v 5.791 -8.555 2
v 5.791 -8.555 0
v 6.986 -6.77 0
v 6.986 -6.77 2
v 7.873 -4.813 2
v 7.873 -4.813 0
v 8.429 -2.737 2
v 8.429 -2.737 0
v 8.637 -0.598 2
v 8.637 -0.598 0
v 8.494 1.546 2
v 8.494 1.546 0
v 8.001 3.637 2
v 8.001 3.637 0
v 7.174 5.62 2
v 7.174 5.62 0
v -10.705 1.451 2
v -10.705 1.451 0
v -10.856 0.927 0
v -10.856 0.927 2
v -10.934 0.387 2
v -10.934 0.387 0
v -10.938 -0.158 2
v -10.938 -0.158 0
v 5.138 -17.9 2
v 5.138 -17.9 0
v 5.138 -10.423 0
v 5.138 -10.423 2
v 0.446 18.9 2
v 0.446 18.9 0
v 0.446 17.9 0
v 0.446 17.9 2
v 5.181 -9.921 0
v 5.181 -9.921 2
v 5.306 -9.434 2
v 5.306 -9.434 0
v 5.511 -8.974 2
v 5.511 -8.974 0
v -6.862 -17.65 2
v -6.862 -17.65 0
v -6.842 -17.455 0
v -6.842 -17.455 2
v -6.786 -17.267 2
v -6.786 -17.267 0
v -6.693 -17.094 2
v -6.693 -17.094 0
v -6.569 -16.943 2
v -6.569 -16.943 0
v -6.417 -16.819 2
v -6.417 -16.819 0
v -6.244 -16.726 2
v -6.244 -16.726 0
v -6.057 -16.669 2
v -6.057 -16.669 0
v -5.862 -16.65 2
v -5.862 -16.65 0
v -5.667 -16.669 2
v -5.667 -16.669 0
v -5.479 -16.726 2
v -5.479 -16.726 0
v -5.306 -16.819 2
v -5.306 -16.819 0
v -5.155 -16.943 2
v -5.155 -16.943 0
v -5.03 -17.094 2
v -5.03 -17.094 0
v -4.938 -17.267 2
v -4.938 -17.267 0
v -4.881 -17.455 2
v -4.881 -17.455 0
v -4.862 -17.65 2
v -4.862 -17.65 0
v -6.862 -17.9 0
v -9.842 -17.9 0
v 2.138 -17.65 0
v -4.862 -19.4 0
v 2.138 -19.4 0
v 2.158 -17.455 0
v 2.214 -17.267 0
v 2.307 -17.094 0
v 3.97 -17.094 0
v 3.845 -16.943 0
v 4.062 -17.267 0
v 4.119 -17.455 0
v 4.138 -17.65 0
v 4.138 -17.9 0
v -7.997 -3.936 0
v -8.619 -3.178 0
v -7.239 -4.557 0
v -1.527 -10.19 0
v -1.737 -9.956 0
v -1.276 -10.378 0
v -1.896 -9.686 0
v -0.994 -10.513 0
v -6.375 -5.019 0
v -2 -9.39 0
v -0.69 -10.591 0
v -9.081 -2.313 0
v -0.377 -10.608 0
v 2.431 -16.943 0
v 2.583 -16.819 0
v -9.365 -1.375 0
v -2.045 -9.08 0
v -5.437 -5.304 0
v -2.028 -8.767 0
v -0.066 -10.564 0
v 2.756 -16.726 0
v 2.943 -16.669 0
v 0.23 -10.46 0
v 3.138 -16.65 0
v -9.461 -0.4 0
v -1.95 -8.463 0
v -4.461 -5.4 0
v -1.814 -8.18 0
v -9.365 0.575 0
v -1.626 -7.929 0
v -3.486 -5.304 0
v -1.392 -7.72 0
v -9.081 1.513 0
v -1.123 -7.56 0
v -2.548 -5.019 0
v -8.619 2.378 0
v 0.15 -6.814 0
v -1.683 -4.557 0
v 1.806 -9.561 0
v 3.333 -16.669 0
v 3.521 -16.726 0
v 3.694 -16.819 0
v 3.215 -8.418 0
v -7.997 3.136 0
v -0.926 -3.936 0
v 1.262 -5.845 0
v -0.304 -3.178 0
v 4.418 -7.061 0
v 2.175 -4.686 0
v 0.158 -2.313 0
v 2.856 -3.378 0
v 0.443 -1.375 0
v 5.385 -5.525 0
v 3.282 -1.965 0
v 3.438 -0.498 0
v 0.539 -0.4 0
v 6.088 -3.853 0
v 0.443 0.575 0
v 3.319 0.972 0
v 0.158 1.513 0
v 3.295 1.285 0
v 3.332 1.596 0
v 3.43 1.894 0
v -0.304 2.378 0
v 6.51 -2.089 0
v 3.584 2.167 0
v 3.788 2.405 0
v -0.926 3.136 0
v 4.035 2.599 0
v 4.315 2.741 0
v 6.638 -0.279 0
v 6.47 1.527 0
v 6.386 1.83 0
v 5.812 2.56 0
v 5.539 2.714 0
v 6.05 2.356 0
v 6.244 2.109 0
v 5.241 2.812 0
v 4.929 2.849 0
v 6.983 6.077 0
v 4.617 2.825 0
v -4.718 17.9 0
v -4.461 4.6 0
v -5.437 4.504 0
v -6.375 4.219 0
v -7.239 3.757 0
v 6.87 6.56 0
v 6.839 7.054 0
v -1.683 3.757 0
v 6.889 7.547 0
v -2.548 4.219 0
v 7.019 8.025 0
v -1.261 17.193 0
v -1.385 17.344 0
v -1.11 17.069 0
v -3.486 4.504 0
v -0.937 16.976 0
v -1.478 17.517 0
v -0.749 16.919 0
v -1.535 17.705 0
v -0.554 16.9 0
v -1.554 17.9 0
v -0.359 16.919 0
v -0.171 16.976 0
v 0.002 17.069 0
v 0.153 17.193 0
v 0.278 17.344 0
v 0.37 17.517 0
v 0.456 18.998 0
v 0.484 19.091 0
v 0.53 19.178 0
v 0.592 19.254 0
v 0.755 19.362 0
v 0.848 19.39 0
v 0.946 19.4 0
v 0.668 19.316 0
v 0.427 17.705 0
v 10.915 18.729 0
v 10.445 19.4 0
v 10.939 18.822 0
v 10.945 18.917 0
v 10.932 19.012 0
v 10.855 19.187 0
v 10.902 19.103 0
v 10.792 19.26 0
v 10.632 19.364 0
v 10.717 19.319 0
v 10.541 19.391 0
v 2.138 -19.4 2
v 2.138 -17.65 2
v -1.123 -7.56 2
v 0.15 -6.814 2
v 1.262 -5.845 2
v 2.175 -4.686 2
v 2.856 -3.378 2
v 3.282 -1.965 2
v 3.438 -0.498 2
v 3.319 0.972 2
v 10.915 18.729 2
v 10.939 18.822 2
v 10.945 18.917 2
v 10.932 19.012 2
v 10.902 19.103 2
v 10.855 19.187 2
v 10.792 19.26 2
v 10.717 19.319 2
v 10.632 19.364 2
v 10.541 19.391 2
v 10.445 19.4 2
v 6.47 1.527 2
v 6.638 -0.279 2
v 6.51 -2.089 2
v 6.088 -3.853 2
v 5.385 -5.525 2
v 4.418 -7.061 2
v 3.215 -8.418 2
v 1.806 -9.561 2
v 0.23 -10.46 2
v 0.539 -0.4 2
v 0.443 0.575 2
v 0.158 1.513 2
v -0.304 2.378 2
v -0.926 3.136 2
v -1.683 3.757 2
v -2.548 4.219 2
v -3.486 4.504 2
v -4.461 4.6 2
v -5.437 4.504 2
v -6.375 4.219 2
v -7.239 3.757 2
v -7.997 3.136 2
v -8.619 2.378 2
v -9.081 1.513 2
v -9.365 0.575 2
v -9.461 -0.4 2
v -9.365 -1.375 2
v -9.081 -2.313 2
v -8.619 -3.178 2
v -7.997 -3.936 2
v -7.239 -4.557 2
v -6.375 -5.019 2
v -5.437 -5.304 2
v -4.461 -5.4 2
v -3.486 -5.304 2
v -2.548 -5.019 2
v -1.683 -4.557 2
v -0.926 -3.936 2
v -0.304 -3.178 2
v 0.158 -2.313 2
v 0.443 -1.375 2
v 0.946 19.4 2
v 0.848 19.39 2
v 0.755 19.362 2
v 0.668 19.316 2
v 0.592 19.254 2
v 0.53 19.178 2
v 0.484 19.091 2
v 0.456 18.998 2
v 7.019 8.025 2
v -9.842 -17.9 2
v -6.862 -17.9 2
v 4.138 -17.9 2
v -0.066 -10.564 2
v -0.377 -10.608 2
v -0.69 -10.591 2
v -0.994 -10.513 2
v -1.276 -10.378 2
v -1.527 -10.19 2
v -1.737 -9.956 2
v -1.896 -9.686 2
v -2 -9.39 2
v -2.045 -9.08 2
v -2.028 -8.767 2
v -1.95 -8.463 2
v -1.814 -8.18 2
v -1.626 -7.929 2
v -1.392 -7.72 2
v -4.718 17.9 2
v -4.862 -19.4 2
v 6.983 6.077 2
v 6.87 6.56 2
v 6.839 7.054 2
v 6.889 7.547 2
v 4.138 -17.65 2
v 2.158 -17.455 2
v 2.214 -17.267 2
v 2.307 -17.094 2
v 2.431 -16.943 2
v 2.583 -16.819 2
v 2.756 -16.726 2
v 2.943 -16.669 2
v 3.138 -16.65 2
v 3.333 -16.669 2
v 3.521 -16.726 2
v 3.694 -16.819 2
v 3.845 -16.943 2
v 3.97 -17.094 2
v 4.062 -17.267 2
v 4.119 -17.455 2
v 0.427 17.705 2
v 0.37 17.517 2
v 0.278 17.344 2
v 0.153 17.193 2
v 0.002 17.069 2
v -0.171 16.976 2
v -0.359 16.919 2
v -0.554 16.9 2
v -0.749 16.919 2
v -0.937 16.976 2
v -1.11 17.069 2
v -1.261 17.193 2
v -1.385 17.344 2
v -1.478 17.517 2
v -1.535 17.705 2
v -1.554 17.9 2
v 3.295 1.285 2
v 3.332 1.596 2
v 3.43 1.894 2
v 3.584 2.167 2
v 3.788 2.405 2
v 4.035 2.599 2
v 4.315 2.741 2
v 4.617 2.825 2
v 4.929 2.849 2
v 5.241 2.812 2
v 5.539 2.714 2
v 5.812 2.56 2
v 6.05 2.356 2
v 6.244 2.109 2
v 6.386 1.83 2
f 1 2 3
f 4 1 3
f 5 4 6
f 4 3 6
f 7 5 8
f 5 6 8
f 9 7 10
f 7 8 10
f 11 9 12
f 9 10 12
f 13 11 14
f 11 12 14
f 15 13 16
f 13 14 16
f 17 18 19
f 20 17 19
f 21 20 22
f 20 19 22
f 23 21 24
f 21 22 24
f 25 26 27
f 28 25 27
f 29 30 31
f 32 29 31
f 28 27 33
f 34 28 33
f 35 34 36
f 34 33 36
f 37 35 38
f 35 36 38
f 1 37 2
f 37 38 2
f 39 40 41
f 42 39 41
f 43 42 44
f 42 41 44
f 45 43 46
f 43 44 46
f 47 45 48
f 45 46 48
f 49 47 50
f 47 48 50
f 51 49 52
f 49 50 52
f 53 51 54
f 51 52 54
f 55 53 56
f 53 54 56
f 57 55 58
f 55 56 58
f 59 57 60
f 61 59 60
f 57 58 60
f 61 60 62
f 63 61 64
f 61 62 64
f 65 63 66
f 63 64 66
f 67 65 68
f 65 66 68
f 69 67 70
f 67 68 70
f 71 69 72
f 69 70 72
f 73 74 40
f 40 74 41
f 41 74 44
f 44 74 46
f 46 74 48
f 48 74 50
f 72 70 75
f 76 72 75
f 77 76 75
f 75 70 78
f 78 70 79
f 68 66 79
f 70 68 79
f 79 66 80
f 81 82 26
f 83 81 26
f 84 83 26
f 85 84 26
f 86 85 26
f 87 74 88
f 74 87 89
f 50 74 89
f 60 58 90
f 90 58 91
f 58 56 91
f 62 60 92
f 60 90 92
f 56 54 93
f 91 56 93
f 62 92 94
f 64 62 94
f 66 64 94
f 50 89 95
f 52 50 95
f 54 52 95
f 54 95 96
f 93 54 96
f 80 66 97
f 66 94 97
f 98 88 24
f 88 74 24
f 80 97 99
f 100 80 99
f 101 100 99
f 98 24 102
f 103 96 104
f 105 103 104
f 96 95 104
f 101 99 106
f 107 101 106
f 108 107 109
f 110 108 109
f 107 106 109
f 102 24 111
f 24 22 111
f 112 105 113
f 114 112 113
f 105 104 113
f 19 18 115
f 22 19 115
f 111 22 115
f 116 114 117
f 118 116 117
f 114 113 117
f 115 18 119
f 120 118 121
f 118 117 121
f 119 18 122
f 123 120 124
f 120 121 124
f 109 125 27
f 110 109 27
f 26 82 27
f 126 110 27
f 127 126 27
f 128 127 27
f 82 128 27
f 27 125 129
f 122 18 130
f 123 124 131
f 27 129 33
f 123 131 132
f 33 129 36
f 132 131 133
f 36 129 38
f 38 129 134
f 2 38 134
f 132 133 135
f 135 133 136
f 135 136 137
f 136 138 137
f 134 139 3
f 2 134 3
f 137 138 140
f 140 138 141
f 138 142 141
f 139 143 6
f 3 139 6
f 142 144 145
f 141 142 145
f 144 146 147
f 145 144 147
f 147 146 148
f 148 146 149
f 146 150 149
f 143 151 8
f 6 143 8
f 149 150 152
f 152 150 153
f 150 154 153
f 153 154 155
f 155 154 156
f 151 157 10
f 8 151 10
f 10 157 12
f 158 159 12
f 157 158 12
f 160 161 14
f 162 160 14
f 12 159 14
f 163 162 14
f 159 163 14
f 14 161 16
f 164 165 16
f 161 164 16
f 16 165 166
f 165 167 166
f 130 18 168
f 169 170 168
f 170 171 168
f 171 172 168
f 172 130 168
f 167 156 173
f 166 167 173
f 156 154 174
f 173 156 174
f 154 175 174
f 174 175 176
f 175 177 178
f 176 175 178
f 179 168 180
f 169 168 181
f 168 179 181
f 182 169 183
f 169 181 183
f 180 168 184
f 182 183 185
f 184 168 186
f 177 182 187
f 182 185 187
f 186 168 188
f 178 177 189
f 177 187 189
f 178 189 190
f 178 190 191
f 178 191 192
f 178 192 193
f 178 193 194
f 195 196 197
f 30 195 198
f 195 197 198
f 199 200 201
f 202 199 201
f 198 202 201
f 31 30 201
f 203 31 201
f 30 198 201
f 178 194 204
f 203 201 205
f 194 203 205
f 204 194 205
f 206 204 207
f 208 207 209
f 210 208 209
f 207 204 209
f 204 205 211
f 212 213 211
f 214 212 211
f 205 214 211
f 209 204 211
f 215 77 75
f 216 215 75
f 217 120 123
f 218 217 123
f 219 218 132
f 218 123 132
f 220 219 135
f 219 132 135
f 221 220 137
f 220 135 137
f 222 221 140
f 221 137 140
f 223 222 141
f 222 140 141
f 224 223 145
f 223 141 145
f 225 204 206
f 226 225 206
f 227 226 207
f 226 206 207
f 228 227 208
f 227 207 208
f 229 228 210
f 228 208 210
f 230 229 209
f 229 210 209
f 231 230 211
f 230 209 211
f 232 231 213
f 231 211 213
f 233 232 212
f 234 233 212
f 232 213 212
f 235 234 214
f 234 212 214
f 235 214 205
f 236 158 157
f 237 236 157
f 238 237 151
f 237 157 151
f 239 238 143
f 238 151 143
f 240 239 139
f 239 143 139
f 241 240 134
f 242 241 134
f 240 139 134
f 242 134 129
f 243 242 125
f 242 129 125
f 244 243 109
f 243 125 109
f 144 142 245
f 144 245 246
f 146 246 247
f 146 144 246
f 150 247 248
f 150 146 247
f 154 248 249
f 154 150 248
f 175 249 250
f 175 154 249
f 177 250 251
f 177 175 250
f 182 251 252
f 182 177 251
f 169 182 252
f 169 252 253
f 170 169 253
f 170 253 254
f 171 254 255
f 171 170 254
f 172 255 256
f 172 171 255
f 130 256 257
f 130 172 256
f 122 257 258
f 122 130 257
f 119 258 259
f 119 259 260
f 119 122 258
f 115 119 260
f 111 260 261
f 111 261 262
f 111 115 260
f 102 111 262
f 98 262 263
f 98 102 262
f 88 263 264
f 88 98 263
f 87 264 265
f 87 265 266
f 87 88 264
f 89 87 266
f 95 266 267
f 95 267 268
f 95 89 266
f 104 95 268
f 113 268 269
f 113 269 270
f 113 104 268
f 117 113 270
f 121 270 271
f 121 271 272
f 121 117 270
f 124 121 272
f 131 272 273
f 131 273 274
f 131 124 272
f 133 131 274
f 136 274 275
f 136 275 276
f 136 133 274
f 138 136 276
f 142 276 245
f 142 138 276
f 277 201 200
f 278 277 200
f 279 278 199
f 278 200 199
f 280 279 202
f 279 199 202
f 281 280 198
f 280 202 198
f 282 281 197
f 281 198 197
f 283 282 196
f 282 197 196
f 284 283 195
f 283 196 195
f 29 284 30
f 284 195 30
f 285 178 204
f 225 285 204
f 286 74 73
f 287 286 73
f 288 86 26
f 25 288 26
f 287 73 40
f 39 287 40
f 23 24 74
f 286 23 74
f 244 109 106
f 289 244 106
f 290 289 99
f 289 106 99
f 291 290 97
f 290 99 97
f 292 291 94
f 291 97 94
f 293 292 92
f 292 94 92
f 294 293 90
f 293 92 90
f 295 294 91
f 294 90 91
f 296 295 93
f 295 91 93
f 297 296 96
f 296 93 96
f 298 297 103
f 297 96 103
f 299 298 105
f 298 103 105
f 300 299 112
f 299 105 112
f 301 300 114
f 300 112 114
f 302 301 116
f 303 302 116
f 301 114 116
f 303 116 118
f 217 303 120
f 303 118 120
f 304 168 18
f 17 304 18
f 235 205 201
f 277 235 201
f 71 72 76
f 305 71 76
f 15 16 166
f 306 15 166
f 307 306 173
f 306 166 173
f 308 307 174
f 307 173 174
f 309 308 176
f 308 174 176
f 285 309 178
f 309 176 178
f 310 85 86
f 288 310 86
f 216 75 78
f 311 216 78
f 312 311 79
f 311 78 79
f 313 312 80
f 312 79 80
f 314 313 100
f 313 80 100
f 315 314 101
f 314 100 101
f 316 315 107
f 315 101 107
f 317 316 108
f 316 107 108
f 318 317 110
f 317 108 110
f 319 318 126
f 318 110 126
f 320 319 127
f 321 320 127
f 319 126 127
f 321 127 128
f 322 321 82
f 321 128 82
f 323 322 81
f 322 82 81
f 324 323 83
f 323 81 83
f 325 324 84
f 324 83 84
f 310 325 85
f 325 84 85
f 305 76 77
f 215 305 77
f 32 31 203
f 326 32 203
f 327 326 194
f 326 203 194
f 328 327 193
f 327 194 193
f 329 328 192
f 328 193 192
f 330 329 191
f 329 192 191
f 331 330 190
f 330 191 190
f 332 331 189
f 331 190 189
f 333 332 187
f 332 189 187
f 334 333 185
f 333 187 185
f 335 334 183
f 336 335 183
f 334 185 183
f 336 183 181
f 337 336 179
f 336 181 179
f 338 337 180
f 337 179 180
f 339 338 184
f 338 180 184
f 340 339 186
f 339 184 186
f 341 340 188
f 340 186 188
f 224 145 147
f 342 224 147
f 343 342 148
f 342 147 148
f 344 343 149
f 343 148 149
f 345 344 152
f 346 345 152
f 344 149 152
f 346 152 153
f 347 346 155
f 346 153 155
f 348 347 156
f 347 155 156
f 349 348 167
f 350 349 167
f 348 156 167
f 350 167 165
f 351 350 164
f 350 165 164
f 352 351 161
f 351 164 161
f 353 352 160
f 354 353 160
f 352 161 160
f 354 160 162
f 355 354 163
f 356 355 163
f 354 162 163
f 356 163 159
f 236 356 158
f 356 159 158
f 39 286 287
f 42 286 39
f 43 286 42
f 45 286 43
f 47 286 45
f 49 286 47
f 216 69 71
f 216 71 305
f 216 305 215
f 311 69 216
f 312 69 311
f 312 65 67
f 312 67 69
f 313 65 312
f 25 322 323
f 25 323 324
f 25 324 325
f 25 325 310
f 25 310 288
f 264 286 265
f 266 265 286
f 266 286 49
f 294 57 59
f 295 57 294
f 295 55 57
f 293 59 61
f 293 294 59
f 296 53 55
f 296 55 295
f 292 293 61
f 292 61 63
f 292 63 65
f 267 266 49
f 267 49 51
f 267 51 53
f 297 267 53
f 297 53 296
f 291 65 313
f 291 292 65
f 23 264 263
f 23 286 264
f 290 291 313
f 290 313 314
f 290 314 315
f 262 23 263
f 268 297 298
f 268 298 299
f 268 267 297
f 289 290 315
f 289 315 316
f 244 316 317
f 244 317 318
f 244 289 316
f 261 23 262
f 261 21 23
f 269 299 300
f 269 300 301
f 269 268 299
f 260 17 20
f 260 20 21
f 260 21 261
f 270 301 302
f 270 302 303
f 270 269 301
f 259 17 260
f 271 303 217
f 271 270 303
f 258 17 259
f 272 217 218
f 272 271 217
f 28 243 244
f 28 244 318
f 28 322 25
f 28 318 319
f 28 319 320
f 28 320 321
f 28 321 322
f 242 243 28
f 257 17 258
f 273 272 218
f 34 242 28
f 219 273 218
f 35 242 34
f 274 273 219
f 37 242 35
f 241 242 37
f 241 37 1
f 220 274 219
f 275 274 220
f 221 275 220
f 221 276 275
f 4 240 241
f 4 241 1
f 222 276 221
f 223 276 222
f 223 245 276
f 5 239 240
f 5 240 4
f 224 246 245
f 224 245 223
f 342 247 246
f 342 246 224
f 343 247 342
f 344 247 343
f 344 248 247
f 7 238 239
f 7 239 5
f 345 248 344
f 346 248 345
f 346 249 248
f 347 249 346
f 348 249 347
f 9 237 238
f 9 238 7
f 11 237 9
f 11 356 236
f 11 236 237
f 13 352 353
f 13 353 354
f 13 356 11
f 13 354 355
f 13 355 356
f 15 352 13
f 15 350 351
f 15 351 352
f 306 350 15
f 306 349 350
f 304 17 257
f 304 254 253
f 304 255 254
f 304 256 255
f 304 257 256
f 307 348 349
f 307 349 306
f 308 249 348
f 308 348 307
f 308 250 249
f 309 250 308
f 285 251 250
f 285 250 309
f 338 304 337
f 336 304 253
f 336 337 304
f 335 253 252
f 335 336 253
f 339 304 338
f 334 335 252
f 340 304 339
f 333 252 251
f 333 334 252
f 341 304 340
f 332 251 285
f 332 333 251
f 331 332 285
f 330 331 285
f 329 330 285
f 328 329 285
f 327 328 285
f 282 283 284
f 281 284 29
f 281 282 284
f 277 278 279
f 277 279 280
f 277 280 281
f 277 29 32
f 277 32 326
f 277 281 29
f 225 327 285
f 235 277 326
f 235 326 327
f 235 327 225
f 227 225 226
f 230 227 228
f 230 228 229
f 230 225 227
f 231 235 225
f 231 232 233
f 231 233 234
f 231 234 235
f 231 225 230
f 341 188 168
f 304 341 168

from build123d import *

# Parameters (mm, degrees)
F0_R     = 5
F1_DEPTH = 2


# Not quite as in the source:
# - ends of sketch curves that miss each other by under 0.0002 mm in the source are joined


with BuildPart() as f1:
    # F0 (on Top) → F1 (new body)
    with BuildSketch(Plane.XY):
        with BuildLine():
            ThreePointArc((7.1735815028, 5.6201217427), (6.8442176511, 6.8062722819), (7.0189573047, 8.0248368891))
            Line((7.0189573047, 8.0248368891), (10.91495, 18.72899))
            ThreePointArc((10.91495, 18.72899), (10.8546800333, 19.1867882023), (10.445104, 19.4))
            Line((10.445104, 19.4), (0.946042, 19.4))
            ThreePointArc((0.946042, 19.4), (0.5924886094, 19.2535533906), (0.446042, 18.9))
            Line((0.446042, 18.9), (0.446042, 17.9))
            ThreePointArc((0.446042, 17.9), (-0.553958, 16.9), (-1.553958, 17.9))
            Line((-1.553958, 17.9), (-4.717745, 17.9))
            Line((-4.717745, 17.9), (-10.704846, 1.450575))
            ThreePointArc((-10.704846, 1.450575), (-10.9040414443, 0.6585195076), (-10.9375317857, -0.1575129868))
            Line((-10.9375317857, -0.1575129868), (-9.842048, -17.9))
            Line((-9.842048, -17.9), (-6.861651, -17.9))
            Line((-6.861651, -17.9), (-6.861651, -17.65))
            ThreePointArc((-6.861651, -17.65), (-5.861651, -16.65), (-4.861651, -17.65))
            Line((-4.861651, -17.65), (-4.861651, -19.4))
            Line((-4.861651, -19.4), (2.138349, -19.4))
            Line((2.138349, -19.4), (2.138349, -17.65))
            ThreePointArc((2.138349, -17.65), (3.138349, -16.65), (4.138349, -17.65))
            Line((4.138349, -17.65), (4.138349, -17.9))
            Line((4.138349, -17.9), (5.138349, -17.9))
            Line((5.138349, -17.9), (5.138349, -10.423043))
            ThreePointArc((5.138349, -10.423043), (5.3061038311, -9.4339083765), (5.7906072022, -8.5553951609))
            ThreePointArc((5.7906072022, -8.5553951609), (8.5768989173, -1.6720073498), (7.1735815028, 5.6201217427))
        make_face()
        with Locations((-4.461199, -0.4)):
            Circle(F0_R, mode=Mode.SUBTRACT)
        with BuildLine():
            ThreePointArc((0.2298636534, -10.4600162566), (-1.8964183588, -9.6861134342), (-1.122515215, -7.559831539))
            ThreePointArc((-1.122515215, -7.559831539), (2.5461863518, -4.0478144871), (3.3187823445, 0.9718200607))
            ThreePointArc((3.3187823445, 0.9718200607), (4.6166380137, 2.8253494221), (6.470167407, 1.5274940718))
            ThreePointArc((6.470167407, 1.5274940718), (5.3846210817, -5.5254099269), (0.2298636534, -10.4600162566))
        make_face(mode=Mode.SUBTRACT)
    extrude(amount=F1_DEPTH)


solid = f1.part
